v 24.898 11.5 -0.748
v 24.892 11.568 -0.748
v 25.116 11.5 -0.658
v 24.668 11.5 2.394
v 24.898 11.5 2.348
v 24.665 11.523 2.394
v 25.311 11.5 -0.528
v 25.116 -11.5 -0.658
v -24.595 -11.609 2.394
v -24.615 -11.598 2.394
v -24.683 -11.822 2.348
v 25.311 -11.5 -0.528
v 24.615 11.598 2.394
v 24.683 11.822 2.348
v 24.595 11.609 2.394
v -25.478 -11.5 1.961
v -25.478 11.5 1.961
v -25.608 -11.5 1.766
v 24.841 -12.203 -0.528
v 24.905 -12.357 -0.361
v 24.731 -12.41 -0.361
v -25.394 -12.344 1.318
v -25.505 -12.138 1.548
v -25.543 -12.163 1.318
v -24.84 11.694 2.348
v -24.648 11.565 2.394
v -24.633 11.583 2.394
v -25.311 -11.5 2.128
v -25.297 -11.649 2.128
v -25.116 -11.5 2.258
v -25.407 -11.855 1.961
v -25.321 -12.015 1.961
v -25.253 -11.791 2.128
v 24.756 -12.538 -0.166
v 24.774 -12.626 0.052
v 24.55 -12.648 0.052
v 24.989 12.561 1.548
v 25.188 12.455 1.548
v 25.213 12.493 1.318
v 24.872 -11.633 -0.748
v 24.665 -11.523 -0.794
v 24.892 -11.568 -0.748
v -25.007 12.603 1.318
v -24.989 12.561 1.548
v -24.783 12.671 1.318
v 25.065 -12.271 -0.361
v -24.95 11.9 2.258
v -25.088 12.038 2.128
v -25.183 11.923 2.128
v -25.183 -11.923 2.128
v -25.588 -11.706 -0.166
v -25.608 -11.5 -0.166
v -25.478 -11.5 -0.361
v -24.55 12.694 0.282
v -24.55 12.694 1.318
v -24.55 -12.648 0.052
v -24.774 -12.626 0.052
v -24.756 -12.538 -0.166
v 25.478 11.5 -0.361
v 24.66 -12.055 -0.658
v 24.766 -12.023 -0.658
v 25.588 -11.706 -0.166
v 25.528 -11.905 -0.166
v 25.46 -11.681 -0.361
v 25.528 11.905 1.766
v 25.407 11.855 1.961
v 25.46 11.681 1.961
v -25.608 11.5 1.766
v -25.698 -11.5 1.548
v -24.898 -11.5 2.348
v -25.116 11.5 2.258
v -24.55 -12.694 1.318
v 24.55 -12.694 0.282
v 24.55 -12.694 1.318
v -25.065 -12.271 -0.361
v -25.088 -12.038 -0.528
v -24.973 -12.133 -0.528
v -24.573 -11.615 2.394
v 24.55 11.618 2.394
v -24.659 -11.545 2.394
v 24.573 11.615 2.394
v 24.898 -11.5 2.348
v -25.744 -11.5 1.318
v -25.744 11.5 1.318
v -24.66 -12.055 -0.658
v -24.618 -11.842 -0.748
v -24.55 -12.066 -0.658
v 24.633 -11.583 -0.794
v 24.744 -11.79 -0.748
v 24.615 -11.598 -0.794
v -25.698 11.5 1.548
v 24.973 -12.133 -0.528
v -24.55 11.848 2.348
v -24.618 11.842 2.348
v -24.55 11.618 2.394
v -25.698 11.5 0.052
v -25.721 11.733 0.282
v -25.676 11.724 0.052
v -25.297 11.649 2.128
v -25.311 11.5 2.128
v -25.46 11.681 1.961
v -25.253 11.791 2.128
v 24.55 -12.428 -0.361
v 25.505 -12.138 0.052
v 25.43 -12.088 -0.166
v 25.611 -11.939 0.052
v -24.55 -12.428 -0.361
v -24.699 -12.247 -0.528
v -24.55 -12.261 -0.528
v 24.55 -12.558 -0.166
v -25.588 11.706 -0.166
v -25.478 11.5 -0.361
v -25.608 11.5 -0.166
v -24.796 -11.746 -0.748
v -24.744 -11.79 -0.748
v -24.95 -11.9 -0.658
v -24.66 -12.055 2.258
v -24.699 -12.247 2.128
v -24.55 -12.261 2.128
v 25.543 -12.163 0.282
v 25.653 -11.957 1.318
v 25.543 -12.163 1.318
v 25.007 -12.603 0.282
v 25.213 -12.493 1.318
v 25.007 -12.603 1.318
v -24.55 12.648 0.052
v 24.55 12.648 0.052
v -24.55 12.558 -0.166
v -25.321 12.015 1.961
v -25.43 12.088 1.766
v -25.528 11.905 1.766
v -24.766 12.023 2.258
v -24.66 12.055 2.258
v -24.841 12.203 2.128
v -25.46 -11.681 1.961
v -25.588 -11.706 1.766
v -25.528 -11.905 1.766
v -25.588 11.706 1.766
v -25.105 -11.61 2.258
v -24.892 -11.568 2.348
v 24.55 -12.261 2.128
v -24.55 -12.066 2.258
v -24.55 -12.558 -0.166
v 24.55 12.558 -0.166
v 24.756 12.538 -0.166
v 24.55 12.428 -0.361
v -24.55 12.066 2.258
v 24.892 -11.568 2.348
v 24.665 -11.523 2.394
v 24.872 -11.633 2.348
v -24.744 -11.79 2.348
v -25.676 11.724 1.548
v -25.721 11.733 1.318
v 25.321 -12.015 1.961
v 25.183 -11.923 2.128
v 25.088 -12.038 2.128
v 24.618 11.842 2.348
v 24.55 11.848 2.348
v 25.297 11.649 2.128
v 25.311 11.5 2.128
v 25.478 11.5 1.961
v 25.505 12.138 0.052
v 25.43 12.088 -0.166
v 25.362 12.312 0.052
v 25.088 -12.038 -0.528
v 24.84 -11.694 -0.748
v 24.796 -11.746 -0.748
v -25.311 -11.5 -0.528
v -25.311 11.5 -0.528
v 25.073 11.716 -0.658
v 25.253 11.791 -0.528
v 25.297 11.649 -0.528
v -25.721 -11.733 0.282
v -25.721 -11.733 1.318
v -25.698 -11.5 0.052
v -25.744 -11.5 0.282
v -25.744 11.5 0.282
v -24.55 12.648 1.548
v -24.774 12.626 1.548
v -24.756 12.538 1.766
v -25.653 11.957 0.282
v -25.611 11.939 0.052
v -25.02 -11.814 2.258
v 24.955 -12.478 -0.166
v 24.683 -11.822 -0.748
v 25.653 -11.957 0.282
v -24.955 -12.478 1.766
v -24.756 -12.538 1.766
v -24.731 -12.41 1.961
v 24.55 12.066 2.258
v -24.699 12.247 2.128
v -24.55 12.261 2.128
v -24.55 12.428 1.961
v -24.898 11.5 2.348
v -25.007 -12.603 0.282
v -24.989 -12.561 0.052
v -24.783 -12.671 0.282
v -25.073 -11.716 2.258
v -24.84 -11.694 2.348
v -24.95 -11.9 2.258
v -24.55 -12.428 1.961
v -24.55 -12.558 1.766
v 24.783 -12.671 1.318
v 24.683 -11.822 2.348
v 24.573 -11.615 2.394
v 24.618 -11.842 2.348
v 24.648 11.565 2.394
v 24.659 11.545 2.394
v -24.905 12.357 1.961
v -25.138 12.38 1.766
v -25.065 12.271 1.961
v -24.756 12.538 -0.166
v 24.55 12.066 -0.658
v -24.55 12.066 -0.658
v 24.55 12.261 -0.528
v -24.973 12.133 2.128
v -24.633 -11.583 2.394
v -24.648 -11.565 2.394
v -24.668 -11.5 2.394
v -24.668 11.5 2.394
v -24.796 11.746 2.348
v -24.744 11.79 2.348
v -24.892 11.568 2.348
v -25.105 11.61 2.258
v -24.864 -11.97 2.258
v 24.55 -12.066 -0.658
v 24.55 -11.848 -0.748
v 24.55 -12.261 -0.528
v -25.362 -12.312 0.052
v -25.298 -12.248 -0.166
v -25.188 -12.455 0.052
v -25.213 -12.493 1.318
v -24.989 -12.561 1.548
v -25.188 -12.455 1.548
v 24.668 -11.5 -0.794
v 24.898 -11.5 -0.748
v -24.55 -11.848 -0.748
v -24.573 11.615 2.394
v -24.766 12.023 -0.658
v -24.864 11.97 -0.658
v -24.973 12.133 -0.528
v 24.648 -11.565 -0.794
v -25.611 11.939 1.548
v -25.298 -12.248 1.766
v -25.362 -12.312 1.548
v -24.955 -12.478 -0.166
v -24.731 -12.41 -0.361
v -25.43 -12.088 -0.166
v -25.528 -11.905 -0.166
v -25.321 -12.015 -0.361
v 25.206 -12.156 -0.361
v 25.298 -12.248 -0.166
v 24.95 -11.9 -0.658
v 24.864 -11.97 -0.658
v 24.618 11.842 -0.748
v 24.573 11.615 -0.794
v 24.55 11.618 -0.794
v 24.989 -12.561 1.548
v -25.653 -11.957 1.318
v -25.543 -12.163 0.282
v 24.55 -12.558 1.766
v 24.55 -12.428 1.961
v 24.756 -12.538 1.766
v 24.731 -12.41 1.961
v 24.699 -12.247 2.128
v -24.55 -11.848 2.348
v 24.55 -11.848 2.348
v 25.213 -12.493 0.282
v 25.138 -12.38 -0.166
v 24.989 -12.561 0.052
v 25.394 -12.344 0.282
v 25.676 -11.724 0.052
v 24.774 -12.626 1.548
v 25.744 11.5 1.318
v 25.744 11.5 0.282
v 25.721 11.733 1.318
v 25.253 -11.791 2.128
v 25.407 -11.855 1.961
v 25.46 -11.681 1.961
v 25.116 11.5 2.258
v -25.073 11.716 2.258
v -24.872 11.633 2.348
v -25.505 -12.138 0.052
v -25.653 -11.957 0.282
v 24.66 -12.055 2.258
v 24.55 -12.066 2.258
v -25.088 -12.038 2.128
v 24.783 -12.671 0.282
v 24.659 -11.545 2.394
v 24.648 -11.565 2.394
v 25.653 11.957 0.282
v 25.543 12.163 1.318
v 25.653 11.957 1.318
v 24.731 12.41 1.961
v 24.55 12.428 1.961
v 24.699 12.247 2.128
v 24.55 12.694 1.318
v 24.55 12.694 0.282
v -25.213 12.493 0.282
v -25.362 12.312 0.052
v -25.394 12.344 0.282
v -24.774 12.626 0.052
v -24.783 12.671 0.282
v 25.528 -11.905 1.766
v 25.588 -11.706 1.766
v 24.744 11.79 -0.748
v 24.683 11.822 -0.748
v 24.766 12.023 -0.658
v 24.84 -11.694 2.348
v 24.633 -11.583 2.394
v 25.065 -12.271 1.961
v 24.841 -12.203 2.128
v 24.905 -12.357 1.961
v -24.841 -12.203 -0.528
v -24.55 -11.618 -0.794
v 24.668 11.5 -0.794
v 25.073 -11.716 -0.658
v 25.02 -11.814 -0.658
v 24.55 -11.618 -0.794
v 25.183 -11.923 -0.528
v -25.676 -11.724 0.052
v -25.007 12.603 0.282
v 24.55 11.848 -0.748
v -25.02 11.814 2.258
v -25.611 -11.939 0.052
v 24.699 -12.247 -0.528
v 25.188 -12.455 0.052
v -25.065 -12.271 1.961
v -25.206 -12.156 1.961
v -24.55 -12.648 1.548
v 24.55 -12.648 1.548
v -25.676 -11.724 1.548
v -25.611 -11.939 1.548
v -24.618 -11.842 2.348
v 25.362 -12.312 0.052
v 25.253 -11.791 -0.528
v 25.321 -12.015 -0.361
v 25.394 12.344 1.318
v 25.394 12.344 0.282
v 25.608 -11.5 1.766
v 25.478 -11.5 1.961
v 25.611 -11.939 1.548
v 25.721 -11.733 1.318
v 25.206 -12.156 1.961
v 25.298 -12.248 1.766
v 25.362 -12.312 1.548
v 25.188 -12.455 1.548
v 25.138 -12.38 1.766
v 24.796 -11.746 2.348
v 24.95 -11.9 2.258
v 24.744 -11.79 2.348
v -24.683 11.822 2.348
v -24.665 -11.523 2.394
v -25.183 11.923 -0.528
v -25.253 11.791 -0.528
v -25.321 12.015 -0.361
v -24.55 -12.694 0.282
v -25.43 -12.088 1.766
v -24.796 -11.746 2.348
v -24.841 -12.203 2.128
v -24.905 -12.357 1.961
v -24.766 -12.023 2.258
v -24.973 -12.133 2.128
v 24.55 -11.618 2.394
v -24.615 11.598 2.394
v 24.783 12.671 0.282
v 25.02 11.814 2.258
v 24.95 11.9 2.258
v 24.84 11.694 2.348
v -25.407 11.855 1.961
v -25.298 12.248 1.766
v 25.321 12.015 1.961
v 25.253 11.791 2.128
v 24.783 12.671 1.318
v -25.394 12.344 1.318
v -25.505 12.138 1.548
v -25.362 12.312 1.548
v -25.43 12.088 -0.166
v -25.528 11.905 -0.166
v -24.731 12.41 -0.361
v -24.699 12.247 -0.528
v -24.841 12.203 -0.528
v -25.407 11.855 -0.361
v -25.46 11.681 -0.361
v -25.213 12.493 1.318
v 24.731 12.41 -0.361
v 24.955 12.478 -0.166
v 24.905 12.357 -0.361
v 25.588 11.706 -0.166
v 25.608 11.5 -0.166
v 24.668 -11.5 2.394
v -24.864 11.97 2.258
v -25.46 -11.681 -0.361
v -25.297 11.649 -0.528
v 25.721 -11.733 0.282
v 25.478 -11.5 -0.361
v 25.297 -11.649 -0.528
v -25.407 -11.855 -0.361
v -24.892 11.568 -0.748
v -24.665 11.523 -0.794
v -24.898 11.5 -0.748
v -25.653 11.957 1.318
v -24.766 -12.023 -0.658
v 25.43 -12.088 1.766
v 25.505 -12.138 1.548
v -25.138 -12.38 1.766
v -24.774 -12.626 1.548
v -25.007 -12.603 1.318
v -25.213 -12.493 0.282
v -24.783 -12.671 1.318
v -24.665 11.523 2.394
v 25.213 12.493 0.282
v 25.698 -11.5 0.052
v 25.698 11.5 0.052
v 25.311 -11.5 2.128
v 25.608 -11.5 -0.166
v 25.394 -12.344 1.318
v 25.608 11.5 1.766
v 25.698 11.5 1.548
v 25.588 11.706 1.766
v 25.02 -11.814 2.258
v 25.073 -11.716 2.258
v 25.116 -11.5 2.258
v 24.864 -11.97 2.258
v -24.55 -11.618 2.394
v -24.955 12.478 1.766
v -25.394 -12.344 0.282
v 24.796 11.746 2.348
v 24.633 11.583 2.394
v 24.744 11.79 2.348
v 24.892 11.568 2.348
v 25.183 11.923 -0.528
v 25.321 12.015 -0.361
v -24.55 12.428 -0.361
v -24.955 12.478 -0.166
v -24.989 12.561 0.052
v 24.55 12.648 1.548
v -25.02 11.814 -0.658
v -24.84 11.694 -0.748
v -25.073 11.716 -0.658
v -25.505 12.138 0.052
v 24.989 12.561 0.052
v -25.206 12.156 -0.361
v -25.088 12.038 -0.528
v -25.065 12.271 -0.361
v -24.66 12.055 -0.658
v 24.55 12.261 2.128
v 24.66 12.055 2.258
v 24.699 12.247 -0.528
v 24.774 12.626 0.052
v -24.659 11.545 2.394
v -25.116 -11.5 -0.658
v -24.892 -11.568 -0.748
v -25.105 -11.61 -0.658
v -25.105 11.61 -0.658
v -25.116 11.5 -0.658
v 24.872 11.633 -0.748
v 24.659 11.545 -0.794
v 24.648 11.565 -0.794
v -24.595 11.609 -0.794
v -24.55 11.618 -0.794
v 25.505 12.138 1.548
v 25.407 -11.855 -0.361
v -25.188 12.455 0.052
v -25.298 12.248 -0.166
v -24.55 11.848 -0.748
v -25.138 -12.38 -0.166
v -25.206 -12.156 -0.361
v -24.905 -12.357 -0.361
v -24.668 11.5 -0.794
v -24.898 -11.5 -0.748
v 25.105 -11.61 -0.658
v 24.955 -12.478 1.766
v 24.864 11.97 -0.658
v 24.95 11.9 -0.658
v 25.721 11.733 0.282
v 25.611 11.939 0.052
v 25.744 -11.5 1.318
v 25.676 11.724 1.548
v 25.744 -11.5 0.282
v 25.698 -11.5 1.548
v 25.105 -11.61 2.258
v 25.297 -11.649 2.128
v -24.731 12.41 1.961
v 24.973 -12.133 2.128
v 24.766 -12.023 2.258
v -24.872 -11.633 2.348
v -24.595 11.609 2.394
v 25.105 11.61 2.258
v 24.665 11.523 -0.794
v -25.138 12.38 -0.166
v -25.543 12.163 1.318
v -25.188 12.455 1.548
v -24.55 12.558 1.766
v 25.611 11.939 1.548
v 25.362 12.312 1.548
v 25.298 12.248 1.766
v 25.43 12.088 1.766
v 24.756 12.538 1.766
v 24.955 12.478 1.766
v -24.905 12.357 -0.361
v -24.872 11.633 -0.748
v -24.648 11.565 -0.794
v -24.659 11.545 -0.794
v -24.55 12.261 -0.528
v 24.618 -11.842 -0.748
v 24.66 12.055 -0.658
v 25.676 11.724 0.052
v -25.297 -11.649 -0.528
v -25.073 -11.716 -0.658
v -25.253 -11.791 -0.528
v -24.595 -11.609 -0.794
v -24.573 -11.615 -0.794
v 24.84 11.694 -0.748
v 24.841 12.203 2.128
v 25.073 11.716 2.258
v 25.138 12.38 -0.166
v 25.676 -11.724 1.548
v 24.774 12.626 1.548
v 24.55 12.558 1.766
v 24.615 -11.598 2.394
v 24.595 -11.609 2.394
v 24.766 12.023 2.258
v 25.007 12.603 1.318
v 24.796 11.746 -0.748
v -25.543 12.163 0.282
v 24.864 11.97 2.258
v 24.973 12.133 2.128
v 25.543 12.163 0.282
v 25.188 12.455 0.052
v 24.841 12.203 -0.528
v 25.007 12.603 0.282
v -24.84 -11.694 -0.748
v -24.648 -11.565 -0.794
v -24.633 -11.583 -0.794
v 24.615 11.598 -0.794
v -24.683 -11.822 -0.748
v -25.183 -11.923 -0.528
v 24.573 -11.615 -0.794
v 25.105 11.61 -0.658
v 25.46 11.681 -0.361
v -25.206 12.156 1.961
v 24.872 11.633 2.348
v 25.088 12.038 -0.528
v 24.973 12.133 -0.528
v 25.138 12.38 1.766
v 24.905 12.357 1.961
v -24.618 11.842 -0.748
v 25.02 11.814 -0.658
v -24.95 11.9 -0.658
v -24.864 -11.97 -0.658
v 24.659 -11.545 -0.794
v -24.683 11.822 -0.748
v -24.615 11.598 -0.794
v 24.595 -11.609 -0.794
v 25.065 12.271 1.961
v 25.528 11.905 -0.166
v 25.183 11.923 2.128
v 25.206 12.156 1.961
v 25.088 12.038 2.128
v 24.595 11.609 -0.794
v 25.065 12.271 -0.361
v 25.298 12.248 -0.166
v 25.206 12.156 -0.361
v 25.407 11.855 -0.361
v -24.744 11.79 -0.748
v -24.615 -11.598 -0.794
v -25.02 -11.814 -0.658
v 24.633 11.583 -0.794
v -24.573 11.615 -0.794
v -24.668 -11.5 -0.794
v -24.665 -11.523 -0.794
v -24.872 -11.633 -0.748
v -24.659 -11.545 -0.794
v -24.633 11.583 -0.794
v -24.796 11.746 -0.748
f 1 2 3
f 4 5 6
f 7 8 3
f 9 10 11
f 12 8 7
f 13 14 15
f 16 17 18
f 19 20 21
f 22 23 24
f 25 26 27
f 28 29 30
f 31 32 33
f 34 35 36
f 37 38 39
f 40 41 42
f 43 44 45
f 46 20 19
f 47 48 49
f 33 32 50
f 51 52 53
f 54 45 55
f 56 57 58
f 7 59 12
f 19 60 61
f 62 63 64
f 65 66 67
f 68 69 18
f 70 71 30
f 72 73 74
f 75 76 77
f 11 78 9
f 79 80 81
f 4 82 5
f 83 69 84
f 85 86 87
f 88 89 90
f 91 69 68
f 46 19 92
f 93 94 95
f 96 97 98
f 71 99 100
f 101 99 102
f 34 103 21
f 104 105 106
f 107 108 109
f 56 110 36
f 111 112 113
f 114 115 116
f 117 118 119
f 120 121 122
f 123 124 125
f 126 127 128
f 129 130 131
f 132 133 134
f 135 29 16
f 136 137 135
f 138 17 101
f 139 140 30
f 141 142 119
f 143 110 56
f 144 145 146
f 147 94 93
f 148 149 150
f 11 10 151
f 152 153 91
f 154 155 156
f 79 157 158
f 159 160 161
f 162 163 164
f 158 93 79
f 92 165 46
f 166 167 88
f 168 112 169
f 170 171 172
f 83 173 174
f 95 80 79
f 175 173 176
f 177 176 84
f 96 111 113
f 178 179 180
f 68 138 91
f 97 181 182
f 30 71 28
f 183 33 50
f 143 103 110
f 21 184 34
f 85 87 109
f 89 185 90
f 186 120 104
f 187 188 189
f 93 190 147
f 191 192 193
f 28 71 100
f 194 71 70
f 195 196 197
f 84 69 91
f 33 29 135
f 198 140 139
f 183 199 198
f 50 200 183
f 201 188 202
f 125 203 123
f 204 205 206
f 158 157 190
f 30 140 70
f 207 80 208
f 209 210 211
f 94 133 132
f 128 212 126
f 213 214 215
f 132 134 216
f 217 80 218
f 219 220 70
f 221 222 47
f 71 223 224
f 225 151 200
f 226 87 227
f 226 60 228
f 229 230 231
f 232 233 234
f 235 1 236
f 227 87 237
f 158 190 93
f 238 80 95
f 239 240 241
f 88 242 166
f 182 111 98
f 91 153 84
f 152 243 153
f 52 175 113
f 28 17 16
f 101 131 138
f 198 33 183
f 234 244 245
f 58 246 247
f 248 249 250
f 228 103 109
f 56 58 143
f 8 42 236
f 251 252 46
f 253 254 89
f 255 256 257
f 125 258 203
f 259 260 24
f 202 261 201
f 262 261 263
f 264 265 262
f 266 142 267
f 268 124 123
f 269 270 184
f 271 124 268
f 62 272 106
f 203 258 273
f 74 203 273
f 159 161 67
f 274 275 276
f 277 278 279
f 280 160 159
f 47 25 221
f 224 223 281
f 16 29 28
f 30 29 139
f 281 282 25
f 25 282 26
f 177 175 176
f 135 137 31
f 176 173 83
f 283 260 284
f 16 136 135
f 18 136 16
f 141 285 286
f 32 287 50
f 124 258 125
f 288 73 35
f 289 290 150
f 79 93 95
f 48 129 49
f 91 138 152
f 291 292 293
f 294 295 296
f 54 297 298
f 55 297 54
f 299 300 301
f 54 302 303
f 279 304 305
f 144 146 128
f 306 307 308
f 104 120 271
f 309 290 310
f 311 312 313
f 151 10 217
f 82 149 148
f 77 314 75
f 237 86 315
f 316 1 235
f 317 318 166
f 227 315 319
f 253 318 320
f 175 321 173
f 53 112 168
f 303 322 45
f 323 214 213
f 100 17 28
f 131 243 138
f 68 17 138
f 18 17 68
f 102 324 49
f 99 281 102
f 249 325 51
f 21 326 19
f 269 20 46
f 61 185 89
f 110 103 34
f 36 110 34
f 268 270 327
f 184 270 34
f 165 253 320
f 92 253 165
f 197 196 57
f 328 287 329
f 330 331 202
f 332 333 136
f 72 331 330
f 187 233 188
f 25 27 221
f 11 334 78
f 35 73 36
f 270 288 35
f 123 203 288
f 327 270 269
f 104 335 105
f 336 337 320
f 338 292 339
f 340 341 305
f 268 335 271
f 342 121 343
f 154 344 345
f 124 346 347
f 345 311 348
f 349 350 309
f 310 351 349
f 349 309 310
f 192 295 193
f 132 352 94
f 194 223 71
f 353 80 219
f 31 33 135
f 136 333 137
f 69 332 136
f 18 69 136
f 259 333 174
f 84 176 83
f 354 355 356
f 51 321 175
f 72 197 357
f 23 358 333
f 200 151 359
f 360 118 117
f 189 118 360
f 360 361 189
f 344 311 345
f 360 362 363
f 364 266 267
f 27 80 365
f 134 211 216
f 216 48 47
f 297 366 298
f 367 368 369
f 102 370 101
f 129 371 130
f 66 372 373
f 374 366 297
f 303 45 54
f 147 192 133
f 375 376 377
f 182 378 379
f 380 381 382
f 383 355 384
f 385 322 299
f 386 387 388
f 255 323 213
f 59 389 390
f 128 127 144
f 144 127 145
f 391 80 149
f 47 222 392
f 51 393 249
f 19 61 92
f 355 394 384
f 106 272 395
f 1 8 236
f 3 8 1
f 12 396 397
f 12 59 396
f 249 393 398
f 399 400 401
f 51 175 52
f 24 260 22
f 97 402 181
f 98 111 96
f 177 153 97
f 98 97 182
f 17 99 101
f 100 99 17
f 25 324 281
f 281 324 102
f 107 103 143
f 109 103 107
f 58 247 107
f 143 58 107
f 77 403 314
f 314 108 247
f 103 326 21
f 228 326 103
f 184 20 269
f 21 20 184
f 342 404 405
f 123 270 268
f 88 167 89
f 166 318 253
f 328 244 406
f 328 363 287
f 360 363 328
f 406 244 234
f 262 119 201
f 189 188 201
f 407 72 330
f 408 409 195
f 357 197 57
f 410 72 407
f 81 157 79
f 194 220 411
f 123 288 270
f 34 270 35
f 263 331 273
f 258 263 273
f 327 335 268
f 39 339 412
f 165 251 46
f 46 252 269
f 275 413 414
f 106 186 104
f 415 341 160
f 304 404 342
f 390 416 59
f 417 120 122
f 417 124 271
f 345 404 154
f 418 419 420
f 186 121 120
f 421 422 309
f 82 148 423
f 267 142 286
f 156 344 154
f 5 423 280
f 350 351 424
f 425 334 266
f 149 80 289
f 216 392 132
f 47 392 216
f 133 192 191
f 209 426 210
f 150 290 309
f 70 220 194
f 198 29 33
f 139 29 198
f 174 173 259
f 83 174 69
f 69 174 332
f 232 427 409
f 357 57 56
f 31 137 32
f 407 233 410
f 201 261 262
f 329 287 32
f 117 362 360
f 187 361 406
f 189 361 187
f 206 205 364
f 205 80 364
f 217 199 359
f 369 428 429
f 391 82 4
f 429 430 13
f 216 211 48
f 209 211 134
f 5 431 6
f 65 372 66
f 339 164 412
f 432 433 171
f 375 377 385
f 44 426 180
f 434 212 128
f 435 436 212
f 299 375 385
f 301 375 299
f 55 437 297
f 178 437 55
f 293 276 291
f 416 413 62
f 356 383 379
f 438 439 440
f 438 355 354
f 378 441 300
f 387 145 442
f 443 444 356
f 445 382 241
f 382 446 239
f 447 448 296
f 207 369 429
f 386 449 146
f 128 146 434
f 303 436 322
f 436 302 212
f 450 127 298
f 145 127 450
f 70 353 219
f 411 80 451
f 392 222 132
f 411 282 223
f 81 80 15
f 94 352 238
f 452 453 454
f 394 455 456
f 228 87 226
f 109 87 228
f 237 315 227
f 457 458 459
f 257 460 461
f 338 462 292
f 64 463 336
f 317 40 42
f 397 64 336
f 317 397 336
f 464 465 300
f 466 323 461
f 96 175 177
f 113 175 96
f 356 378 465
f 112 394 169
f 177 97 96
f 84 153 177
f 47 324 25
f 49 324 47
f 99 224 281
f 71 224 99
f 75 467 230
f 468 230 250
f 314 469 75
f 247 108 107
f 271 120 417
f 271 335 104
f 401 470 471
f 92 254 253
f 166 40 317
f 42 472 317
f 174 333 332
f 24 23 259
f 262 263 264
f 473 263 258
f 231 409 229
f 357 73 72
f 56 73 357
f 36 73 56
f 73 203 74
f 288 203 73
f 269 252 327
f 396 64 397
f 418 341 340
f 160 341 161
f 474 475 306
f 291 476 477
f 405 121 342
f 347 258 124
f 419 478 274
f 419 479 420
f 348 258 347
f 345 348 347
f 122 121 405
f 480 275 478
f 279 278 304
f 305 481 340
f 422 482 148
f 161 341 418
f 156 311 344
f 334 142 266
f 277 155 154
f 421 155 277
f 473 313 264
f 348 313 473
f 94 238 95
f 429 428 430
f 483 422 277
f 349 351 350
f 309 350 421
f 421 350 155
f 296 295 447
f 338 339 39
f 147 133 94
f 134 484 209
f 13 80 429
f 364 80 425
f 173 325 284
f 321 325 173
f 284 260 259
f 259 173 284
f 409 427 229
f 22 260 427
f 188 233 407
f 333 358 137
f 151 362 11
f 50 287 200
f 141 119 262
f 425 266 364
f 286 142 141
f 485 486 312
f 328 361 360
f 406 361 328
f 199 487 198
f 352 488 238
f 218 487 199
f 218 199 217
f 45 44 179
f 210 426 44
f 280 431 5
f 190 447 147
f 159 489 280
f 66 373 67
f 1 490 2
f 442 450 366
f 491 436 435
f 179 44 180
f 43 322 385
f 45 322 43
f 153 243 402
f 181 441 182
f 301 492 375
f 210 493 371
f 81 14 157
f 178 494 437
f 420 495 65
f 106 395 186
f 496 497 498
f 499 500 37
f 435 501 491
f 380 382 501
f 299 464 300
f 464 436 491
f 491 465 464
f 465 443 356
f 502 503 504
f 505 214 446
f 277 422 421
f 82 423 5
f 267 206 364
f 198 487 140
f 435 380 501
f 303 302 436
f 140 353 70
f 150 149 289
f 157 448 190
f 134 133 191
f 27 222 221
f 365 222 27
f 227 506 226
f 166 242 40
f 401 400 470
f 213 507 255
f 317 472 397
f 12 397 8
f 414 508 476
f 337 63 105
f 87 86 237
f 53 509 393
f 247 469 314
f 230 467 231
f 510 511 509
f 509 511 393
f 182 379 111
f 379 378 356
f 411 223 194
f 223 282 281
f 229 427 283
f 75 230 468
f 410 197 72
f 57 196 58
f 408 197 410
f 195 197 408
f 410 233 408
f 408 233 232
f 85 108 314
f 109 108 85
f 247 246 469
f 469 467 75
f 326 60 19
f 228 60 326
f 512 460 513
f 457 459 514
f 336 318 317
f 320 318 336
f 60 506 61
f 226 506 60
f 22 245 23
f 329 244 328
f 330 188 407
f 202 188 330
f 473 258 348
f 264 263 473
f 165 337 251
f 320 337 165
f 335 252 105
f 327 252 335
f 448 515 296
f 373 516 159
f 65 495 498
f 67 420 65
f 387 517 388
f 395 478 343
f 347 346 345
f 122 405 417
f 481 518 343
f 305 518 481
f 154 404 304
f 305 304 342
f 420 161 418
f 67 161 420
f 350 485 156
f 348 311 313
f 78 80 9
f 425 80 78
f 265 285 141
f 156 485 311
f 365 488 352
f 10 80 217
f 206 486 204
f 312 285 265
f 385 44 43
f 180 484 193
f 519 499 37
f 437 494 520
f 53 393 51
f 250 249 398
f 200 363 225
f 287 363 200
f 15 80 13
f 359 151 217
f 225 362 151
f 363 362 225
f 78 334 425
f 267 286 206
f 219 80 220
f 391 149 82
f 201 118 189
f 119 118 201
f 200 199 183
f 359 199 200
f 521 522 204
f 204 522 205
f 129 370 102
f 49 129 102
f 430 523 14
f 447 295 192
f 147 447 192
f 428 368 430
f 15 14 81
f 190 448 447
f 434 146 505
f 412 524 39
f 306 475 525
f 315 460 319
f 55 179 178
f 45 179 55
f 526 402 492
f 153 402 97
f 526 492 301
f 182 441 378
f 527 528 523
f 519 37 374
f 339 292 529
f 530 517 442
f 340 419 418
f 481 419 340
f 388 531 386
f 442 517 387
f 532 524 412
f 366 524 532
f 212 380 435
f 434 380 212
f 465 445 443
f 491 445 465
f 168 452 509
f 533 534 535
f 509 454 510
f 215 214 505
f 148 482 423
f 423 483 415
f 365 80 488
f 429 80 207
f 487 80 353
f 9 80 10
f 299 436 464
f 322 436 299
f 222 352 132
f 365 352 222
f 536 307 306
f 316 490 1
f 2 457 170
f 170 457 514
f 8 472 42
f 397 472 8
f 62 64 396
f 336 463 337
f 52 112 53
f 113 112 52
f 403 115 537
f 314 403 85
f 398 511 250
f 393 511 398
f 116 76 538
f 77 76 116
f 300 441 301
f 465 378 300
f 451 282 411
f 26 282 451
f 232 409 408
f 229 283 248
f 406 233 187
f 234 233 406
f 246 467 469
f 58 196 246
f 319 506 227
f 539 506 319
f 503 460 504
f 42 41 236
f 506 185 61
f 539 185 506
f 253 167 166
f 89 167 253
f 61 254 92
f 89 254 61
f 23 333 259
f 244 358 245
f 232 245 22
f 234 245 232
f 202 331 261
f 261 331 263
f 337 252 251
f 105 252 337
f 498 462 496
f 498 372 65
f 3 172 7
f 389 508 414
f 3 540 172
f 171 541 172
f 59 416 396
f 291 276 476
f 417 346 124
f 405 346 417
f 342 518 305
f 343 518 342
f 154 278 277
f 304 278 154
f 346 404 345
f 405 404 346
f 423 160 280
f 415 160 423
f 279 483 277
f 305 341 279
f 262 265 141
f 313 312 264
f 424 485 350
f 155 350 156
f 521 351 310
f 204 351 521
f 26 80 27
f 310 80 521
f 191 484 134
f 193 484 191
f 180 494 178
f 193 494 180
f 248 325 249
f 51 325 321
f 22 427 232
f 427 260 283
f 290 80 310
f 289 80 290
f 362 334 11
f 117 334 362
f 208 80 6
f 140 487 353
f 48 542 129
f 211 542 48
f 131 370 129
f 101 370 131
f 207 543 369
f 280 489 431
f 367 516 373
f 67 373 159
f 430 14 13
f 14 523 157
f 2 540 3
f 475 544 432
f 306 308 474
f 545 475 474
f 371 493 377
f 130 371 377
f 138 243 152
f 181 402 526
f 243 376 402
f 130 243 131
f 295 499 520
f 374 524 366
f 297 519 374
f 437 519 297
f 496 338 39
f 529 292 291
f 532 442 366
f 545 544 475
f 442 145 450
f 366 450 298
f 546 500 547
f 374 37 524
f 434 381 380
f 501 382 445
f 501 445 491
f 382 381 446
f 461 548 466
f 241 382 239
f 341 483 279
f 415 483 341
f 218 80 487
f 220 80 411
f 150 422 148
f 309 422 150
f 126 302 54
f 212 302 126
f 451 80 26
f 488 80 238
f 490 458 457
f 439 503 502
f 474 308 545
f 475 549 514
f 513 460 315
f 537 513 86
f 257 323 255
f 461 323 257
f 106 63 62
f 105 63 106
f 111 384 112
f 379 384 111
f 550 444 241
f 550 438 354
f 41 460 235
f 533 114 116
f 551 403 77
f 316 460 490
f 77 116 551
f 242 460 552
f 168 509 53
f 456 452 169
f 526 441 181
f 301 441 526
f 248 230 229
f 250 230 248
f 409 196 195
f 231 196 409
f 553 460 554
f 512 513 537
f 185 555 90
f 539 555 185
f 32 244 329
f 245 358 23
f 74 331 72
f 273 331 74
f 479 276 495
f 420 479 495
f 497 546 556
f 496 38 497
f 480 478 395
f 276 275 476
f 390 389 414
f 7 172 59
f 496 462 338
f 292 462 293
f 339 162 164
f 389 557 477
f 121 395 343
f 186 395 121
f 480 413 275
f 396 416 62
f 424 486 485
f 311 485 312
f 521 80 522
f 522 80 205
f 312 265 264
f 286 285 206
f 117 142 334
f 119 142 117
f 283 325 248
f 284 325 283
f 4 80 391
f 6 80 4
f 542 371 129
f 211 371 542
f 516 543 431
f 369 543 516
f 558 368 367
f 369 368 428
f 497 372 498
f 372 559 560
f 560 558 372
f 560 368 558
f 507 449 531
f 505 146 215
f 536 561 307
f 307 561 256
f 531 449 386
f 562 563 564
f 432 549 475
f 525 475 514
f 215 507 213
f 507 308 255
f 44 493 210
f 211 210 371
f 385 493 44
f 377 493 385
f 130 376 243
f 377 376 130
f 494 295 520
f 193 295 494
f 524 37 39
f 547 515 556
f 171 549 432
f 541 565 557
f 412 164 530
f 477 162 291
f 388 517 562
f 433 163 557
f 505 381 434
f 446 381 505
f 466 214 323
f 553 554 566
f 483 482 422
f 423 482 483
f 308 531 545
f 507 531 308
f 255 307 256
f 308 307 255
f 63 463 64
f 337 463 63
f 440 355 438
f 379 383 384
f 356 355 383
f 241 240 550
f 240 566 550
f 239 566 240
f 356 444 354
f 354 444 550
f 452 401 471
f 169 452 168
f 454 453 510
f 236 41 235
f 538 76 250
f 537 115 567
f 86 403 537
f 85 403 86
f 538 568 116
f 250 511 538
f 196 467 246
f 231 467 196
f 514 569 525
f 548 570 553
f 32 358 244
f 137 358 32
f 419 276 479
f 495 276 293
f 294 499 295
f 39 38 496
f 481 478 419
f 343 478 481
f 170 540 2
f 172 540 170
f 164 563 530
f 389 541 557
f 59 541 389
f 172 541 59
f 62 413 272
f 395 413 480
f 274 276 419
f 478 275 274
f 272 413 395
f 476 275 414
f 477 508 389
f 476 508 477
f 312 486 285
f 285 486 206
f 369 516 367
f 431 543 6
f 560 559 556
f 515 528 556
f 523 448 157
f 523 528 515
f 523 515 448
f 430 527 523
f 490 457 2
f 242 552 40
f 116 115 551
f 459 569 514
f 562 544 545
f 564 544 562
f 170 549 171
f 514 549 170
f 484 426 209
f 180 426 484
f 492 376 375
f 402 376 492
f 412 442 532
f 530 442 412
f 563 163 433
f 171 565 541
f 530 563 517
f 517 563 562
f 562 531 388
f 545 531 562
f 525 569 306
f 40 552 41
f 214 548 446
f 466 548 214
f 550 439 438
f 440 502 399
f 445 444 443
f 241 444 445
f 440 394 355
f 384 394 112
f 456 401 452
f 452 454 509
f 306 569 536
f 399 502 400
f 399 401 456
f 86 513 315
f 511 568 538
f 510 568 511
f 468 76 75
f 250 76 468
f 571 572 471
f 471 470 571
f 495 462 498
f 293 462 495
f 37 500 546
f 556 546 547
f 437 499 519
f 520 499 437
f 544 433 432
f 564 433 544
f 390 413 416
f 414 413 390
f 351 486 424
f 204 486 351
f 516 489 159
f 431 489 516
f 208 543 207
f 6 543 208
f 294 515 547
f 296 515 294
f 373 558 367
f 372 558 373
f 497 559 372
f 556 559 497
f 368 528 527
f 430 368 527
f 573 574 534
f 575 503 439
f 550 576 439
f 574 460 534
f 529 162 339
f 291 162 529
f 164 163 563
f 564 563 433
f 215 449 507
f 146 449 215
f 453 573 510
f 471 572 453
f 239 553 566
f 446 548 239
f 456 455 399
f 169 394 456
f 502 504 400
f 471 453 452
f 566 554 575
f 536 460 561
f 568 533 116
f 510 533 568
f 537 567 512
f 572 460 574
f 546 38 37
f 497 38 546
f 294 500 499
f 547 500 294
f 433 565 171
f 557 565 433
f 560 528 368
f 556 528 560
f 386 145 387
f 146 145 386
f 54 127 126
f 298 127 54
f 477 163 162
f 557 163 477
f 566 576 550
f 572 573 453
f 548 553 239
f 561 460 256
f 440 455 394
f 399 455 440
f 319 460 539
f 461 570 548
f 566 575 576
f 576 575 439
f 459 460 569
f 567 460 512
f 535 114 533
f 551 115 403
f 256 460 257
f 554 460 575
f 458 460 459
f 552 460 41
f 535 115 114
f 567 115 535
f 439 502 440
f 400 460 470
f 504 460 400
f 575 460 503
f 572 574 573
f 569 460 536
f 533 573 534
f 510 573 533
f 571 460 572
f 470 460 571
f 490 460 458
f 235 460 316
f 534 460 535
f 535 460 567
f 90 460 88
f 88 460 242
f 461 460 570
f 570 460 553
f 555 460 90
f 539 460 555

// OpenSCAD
// ESP32 DevKit V1 (ESP32 DevKit V1) visual source for NexCAD.
// Units: millimeters. Origin: part bottom-center, matching src/parts/library.ts.
// This generated baseline is intentionally simple; refine it with measured details before exporting STL.

$fn = 32;

module rounded_box(size, r = 0.8) {
  hull() {
    for (x = [-size[0] / 2 + r, size[0] / 2 - r])
      for (y = [-size[1] / 2 + r, size[1] / 2 - r]) {
        translate([x, y, r]) sphere(r = r);
        translate([x, y, size[2] - r]) sphere(r = r);
      }
  }
}

color("#2e7d5b") rounded_box([51.5, 25.4, 1.6], min(1.2, min(51.5, 25.4) / 8));
